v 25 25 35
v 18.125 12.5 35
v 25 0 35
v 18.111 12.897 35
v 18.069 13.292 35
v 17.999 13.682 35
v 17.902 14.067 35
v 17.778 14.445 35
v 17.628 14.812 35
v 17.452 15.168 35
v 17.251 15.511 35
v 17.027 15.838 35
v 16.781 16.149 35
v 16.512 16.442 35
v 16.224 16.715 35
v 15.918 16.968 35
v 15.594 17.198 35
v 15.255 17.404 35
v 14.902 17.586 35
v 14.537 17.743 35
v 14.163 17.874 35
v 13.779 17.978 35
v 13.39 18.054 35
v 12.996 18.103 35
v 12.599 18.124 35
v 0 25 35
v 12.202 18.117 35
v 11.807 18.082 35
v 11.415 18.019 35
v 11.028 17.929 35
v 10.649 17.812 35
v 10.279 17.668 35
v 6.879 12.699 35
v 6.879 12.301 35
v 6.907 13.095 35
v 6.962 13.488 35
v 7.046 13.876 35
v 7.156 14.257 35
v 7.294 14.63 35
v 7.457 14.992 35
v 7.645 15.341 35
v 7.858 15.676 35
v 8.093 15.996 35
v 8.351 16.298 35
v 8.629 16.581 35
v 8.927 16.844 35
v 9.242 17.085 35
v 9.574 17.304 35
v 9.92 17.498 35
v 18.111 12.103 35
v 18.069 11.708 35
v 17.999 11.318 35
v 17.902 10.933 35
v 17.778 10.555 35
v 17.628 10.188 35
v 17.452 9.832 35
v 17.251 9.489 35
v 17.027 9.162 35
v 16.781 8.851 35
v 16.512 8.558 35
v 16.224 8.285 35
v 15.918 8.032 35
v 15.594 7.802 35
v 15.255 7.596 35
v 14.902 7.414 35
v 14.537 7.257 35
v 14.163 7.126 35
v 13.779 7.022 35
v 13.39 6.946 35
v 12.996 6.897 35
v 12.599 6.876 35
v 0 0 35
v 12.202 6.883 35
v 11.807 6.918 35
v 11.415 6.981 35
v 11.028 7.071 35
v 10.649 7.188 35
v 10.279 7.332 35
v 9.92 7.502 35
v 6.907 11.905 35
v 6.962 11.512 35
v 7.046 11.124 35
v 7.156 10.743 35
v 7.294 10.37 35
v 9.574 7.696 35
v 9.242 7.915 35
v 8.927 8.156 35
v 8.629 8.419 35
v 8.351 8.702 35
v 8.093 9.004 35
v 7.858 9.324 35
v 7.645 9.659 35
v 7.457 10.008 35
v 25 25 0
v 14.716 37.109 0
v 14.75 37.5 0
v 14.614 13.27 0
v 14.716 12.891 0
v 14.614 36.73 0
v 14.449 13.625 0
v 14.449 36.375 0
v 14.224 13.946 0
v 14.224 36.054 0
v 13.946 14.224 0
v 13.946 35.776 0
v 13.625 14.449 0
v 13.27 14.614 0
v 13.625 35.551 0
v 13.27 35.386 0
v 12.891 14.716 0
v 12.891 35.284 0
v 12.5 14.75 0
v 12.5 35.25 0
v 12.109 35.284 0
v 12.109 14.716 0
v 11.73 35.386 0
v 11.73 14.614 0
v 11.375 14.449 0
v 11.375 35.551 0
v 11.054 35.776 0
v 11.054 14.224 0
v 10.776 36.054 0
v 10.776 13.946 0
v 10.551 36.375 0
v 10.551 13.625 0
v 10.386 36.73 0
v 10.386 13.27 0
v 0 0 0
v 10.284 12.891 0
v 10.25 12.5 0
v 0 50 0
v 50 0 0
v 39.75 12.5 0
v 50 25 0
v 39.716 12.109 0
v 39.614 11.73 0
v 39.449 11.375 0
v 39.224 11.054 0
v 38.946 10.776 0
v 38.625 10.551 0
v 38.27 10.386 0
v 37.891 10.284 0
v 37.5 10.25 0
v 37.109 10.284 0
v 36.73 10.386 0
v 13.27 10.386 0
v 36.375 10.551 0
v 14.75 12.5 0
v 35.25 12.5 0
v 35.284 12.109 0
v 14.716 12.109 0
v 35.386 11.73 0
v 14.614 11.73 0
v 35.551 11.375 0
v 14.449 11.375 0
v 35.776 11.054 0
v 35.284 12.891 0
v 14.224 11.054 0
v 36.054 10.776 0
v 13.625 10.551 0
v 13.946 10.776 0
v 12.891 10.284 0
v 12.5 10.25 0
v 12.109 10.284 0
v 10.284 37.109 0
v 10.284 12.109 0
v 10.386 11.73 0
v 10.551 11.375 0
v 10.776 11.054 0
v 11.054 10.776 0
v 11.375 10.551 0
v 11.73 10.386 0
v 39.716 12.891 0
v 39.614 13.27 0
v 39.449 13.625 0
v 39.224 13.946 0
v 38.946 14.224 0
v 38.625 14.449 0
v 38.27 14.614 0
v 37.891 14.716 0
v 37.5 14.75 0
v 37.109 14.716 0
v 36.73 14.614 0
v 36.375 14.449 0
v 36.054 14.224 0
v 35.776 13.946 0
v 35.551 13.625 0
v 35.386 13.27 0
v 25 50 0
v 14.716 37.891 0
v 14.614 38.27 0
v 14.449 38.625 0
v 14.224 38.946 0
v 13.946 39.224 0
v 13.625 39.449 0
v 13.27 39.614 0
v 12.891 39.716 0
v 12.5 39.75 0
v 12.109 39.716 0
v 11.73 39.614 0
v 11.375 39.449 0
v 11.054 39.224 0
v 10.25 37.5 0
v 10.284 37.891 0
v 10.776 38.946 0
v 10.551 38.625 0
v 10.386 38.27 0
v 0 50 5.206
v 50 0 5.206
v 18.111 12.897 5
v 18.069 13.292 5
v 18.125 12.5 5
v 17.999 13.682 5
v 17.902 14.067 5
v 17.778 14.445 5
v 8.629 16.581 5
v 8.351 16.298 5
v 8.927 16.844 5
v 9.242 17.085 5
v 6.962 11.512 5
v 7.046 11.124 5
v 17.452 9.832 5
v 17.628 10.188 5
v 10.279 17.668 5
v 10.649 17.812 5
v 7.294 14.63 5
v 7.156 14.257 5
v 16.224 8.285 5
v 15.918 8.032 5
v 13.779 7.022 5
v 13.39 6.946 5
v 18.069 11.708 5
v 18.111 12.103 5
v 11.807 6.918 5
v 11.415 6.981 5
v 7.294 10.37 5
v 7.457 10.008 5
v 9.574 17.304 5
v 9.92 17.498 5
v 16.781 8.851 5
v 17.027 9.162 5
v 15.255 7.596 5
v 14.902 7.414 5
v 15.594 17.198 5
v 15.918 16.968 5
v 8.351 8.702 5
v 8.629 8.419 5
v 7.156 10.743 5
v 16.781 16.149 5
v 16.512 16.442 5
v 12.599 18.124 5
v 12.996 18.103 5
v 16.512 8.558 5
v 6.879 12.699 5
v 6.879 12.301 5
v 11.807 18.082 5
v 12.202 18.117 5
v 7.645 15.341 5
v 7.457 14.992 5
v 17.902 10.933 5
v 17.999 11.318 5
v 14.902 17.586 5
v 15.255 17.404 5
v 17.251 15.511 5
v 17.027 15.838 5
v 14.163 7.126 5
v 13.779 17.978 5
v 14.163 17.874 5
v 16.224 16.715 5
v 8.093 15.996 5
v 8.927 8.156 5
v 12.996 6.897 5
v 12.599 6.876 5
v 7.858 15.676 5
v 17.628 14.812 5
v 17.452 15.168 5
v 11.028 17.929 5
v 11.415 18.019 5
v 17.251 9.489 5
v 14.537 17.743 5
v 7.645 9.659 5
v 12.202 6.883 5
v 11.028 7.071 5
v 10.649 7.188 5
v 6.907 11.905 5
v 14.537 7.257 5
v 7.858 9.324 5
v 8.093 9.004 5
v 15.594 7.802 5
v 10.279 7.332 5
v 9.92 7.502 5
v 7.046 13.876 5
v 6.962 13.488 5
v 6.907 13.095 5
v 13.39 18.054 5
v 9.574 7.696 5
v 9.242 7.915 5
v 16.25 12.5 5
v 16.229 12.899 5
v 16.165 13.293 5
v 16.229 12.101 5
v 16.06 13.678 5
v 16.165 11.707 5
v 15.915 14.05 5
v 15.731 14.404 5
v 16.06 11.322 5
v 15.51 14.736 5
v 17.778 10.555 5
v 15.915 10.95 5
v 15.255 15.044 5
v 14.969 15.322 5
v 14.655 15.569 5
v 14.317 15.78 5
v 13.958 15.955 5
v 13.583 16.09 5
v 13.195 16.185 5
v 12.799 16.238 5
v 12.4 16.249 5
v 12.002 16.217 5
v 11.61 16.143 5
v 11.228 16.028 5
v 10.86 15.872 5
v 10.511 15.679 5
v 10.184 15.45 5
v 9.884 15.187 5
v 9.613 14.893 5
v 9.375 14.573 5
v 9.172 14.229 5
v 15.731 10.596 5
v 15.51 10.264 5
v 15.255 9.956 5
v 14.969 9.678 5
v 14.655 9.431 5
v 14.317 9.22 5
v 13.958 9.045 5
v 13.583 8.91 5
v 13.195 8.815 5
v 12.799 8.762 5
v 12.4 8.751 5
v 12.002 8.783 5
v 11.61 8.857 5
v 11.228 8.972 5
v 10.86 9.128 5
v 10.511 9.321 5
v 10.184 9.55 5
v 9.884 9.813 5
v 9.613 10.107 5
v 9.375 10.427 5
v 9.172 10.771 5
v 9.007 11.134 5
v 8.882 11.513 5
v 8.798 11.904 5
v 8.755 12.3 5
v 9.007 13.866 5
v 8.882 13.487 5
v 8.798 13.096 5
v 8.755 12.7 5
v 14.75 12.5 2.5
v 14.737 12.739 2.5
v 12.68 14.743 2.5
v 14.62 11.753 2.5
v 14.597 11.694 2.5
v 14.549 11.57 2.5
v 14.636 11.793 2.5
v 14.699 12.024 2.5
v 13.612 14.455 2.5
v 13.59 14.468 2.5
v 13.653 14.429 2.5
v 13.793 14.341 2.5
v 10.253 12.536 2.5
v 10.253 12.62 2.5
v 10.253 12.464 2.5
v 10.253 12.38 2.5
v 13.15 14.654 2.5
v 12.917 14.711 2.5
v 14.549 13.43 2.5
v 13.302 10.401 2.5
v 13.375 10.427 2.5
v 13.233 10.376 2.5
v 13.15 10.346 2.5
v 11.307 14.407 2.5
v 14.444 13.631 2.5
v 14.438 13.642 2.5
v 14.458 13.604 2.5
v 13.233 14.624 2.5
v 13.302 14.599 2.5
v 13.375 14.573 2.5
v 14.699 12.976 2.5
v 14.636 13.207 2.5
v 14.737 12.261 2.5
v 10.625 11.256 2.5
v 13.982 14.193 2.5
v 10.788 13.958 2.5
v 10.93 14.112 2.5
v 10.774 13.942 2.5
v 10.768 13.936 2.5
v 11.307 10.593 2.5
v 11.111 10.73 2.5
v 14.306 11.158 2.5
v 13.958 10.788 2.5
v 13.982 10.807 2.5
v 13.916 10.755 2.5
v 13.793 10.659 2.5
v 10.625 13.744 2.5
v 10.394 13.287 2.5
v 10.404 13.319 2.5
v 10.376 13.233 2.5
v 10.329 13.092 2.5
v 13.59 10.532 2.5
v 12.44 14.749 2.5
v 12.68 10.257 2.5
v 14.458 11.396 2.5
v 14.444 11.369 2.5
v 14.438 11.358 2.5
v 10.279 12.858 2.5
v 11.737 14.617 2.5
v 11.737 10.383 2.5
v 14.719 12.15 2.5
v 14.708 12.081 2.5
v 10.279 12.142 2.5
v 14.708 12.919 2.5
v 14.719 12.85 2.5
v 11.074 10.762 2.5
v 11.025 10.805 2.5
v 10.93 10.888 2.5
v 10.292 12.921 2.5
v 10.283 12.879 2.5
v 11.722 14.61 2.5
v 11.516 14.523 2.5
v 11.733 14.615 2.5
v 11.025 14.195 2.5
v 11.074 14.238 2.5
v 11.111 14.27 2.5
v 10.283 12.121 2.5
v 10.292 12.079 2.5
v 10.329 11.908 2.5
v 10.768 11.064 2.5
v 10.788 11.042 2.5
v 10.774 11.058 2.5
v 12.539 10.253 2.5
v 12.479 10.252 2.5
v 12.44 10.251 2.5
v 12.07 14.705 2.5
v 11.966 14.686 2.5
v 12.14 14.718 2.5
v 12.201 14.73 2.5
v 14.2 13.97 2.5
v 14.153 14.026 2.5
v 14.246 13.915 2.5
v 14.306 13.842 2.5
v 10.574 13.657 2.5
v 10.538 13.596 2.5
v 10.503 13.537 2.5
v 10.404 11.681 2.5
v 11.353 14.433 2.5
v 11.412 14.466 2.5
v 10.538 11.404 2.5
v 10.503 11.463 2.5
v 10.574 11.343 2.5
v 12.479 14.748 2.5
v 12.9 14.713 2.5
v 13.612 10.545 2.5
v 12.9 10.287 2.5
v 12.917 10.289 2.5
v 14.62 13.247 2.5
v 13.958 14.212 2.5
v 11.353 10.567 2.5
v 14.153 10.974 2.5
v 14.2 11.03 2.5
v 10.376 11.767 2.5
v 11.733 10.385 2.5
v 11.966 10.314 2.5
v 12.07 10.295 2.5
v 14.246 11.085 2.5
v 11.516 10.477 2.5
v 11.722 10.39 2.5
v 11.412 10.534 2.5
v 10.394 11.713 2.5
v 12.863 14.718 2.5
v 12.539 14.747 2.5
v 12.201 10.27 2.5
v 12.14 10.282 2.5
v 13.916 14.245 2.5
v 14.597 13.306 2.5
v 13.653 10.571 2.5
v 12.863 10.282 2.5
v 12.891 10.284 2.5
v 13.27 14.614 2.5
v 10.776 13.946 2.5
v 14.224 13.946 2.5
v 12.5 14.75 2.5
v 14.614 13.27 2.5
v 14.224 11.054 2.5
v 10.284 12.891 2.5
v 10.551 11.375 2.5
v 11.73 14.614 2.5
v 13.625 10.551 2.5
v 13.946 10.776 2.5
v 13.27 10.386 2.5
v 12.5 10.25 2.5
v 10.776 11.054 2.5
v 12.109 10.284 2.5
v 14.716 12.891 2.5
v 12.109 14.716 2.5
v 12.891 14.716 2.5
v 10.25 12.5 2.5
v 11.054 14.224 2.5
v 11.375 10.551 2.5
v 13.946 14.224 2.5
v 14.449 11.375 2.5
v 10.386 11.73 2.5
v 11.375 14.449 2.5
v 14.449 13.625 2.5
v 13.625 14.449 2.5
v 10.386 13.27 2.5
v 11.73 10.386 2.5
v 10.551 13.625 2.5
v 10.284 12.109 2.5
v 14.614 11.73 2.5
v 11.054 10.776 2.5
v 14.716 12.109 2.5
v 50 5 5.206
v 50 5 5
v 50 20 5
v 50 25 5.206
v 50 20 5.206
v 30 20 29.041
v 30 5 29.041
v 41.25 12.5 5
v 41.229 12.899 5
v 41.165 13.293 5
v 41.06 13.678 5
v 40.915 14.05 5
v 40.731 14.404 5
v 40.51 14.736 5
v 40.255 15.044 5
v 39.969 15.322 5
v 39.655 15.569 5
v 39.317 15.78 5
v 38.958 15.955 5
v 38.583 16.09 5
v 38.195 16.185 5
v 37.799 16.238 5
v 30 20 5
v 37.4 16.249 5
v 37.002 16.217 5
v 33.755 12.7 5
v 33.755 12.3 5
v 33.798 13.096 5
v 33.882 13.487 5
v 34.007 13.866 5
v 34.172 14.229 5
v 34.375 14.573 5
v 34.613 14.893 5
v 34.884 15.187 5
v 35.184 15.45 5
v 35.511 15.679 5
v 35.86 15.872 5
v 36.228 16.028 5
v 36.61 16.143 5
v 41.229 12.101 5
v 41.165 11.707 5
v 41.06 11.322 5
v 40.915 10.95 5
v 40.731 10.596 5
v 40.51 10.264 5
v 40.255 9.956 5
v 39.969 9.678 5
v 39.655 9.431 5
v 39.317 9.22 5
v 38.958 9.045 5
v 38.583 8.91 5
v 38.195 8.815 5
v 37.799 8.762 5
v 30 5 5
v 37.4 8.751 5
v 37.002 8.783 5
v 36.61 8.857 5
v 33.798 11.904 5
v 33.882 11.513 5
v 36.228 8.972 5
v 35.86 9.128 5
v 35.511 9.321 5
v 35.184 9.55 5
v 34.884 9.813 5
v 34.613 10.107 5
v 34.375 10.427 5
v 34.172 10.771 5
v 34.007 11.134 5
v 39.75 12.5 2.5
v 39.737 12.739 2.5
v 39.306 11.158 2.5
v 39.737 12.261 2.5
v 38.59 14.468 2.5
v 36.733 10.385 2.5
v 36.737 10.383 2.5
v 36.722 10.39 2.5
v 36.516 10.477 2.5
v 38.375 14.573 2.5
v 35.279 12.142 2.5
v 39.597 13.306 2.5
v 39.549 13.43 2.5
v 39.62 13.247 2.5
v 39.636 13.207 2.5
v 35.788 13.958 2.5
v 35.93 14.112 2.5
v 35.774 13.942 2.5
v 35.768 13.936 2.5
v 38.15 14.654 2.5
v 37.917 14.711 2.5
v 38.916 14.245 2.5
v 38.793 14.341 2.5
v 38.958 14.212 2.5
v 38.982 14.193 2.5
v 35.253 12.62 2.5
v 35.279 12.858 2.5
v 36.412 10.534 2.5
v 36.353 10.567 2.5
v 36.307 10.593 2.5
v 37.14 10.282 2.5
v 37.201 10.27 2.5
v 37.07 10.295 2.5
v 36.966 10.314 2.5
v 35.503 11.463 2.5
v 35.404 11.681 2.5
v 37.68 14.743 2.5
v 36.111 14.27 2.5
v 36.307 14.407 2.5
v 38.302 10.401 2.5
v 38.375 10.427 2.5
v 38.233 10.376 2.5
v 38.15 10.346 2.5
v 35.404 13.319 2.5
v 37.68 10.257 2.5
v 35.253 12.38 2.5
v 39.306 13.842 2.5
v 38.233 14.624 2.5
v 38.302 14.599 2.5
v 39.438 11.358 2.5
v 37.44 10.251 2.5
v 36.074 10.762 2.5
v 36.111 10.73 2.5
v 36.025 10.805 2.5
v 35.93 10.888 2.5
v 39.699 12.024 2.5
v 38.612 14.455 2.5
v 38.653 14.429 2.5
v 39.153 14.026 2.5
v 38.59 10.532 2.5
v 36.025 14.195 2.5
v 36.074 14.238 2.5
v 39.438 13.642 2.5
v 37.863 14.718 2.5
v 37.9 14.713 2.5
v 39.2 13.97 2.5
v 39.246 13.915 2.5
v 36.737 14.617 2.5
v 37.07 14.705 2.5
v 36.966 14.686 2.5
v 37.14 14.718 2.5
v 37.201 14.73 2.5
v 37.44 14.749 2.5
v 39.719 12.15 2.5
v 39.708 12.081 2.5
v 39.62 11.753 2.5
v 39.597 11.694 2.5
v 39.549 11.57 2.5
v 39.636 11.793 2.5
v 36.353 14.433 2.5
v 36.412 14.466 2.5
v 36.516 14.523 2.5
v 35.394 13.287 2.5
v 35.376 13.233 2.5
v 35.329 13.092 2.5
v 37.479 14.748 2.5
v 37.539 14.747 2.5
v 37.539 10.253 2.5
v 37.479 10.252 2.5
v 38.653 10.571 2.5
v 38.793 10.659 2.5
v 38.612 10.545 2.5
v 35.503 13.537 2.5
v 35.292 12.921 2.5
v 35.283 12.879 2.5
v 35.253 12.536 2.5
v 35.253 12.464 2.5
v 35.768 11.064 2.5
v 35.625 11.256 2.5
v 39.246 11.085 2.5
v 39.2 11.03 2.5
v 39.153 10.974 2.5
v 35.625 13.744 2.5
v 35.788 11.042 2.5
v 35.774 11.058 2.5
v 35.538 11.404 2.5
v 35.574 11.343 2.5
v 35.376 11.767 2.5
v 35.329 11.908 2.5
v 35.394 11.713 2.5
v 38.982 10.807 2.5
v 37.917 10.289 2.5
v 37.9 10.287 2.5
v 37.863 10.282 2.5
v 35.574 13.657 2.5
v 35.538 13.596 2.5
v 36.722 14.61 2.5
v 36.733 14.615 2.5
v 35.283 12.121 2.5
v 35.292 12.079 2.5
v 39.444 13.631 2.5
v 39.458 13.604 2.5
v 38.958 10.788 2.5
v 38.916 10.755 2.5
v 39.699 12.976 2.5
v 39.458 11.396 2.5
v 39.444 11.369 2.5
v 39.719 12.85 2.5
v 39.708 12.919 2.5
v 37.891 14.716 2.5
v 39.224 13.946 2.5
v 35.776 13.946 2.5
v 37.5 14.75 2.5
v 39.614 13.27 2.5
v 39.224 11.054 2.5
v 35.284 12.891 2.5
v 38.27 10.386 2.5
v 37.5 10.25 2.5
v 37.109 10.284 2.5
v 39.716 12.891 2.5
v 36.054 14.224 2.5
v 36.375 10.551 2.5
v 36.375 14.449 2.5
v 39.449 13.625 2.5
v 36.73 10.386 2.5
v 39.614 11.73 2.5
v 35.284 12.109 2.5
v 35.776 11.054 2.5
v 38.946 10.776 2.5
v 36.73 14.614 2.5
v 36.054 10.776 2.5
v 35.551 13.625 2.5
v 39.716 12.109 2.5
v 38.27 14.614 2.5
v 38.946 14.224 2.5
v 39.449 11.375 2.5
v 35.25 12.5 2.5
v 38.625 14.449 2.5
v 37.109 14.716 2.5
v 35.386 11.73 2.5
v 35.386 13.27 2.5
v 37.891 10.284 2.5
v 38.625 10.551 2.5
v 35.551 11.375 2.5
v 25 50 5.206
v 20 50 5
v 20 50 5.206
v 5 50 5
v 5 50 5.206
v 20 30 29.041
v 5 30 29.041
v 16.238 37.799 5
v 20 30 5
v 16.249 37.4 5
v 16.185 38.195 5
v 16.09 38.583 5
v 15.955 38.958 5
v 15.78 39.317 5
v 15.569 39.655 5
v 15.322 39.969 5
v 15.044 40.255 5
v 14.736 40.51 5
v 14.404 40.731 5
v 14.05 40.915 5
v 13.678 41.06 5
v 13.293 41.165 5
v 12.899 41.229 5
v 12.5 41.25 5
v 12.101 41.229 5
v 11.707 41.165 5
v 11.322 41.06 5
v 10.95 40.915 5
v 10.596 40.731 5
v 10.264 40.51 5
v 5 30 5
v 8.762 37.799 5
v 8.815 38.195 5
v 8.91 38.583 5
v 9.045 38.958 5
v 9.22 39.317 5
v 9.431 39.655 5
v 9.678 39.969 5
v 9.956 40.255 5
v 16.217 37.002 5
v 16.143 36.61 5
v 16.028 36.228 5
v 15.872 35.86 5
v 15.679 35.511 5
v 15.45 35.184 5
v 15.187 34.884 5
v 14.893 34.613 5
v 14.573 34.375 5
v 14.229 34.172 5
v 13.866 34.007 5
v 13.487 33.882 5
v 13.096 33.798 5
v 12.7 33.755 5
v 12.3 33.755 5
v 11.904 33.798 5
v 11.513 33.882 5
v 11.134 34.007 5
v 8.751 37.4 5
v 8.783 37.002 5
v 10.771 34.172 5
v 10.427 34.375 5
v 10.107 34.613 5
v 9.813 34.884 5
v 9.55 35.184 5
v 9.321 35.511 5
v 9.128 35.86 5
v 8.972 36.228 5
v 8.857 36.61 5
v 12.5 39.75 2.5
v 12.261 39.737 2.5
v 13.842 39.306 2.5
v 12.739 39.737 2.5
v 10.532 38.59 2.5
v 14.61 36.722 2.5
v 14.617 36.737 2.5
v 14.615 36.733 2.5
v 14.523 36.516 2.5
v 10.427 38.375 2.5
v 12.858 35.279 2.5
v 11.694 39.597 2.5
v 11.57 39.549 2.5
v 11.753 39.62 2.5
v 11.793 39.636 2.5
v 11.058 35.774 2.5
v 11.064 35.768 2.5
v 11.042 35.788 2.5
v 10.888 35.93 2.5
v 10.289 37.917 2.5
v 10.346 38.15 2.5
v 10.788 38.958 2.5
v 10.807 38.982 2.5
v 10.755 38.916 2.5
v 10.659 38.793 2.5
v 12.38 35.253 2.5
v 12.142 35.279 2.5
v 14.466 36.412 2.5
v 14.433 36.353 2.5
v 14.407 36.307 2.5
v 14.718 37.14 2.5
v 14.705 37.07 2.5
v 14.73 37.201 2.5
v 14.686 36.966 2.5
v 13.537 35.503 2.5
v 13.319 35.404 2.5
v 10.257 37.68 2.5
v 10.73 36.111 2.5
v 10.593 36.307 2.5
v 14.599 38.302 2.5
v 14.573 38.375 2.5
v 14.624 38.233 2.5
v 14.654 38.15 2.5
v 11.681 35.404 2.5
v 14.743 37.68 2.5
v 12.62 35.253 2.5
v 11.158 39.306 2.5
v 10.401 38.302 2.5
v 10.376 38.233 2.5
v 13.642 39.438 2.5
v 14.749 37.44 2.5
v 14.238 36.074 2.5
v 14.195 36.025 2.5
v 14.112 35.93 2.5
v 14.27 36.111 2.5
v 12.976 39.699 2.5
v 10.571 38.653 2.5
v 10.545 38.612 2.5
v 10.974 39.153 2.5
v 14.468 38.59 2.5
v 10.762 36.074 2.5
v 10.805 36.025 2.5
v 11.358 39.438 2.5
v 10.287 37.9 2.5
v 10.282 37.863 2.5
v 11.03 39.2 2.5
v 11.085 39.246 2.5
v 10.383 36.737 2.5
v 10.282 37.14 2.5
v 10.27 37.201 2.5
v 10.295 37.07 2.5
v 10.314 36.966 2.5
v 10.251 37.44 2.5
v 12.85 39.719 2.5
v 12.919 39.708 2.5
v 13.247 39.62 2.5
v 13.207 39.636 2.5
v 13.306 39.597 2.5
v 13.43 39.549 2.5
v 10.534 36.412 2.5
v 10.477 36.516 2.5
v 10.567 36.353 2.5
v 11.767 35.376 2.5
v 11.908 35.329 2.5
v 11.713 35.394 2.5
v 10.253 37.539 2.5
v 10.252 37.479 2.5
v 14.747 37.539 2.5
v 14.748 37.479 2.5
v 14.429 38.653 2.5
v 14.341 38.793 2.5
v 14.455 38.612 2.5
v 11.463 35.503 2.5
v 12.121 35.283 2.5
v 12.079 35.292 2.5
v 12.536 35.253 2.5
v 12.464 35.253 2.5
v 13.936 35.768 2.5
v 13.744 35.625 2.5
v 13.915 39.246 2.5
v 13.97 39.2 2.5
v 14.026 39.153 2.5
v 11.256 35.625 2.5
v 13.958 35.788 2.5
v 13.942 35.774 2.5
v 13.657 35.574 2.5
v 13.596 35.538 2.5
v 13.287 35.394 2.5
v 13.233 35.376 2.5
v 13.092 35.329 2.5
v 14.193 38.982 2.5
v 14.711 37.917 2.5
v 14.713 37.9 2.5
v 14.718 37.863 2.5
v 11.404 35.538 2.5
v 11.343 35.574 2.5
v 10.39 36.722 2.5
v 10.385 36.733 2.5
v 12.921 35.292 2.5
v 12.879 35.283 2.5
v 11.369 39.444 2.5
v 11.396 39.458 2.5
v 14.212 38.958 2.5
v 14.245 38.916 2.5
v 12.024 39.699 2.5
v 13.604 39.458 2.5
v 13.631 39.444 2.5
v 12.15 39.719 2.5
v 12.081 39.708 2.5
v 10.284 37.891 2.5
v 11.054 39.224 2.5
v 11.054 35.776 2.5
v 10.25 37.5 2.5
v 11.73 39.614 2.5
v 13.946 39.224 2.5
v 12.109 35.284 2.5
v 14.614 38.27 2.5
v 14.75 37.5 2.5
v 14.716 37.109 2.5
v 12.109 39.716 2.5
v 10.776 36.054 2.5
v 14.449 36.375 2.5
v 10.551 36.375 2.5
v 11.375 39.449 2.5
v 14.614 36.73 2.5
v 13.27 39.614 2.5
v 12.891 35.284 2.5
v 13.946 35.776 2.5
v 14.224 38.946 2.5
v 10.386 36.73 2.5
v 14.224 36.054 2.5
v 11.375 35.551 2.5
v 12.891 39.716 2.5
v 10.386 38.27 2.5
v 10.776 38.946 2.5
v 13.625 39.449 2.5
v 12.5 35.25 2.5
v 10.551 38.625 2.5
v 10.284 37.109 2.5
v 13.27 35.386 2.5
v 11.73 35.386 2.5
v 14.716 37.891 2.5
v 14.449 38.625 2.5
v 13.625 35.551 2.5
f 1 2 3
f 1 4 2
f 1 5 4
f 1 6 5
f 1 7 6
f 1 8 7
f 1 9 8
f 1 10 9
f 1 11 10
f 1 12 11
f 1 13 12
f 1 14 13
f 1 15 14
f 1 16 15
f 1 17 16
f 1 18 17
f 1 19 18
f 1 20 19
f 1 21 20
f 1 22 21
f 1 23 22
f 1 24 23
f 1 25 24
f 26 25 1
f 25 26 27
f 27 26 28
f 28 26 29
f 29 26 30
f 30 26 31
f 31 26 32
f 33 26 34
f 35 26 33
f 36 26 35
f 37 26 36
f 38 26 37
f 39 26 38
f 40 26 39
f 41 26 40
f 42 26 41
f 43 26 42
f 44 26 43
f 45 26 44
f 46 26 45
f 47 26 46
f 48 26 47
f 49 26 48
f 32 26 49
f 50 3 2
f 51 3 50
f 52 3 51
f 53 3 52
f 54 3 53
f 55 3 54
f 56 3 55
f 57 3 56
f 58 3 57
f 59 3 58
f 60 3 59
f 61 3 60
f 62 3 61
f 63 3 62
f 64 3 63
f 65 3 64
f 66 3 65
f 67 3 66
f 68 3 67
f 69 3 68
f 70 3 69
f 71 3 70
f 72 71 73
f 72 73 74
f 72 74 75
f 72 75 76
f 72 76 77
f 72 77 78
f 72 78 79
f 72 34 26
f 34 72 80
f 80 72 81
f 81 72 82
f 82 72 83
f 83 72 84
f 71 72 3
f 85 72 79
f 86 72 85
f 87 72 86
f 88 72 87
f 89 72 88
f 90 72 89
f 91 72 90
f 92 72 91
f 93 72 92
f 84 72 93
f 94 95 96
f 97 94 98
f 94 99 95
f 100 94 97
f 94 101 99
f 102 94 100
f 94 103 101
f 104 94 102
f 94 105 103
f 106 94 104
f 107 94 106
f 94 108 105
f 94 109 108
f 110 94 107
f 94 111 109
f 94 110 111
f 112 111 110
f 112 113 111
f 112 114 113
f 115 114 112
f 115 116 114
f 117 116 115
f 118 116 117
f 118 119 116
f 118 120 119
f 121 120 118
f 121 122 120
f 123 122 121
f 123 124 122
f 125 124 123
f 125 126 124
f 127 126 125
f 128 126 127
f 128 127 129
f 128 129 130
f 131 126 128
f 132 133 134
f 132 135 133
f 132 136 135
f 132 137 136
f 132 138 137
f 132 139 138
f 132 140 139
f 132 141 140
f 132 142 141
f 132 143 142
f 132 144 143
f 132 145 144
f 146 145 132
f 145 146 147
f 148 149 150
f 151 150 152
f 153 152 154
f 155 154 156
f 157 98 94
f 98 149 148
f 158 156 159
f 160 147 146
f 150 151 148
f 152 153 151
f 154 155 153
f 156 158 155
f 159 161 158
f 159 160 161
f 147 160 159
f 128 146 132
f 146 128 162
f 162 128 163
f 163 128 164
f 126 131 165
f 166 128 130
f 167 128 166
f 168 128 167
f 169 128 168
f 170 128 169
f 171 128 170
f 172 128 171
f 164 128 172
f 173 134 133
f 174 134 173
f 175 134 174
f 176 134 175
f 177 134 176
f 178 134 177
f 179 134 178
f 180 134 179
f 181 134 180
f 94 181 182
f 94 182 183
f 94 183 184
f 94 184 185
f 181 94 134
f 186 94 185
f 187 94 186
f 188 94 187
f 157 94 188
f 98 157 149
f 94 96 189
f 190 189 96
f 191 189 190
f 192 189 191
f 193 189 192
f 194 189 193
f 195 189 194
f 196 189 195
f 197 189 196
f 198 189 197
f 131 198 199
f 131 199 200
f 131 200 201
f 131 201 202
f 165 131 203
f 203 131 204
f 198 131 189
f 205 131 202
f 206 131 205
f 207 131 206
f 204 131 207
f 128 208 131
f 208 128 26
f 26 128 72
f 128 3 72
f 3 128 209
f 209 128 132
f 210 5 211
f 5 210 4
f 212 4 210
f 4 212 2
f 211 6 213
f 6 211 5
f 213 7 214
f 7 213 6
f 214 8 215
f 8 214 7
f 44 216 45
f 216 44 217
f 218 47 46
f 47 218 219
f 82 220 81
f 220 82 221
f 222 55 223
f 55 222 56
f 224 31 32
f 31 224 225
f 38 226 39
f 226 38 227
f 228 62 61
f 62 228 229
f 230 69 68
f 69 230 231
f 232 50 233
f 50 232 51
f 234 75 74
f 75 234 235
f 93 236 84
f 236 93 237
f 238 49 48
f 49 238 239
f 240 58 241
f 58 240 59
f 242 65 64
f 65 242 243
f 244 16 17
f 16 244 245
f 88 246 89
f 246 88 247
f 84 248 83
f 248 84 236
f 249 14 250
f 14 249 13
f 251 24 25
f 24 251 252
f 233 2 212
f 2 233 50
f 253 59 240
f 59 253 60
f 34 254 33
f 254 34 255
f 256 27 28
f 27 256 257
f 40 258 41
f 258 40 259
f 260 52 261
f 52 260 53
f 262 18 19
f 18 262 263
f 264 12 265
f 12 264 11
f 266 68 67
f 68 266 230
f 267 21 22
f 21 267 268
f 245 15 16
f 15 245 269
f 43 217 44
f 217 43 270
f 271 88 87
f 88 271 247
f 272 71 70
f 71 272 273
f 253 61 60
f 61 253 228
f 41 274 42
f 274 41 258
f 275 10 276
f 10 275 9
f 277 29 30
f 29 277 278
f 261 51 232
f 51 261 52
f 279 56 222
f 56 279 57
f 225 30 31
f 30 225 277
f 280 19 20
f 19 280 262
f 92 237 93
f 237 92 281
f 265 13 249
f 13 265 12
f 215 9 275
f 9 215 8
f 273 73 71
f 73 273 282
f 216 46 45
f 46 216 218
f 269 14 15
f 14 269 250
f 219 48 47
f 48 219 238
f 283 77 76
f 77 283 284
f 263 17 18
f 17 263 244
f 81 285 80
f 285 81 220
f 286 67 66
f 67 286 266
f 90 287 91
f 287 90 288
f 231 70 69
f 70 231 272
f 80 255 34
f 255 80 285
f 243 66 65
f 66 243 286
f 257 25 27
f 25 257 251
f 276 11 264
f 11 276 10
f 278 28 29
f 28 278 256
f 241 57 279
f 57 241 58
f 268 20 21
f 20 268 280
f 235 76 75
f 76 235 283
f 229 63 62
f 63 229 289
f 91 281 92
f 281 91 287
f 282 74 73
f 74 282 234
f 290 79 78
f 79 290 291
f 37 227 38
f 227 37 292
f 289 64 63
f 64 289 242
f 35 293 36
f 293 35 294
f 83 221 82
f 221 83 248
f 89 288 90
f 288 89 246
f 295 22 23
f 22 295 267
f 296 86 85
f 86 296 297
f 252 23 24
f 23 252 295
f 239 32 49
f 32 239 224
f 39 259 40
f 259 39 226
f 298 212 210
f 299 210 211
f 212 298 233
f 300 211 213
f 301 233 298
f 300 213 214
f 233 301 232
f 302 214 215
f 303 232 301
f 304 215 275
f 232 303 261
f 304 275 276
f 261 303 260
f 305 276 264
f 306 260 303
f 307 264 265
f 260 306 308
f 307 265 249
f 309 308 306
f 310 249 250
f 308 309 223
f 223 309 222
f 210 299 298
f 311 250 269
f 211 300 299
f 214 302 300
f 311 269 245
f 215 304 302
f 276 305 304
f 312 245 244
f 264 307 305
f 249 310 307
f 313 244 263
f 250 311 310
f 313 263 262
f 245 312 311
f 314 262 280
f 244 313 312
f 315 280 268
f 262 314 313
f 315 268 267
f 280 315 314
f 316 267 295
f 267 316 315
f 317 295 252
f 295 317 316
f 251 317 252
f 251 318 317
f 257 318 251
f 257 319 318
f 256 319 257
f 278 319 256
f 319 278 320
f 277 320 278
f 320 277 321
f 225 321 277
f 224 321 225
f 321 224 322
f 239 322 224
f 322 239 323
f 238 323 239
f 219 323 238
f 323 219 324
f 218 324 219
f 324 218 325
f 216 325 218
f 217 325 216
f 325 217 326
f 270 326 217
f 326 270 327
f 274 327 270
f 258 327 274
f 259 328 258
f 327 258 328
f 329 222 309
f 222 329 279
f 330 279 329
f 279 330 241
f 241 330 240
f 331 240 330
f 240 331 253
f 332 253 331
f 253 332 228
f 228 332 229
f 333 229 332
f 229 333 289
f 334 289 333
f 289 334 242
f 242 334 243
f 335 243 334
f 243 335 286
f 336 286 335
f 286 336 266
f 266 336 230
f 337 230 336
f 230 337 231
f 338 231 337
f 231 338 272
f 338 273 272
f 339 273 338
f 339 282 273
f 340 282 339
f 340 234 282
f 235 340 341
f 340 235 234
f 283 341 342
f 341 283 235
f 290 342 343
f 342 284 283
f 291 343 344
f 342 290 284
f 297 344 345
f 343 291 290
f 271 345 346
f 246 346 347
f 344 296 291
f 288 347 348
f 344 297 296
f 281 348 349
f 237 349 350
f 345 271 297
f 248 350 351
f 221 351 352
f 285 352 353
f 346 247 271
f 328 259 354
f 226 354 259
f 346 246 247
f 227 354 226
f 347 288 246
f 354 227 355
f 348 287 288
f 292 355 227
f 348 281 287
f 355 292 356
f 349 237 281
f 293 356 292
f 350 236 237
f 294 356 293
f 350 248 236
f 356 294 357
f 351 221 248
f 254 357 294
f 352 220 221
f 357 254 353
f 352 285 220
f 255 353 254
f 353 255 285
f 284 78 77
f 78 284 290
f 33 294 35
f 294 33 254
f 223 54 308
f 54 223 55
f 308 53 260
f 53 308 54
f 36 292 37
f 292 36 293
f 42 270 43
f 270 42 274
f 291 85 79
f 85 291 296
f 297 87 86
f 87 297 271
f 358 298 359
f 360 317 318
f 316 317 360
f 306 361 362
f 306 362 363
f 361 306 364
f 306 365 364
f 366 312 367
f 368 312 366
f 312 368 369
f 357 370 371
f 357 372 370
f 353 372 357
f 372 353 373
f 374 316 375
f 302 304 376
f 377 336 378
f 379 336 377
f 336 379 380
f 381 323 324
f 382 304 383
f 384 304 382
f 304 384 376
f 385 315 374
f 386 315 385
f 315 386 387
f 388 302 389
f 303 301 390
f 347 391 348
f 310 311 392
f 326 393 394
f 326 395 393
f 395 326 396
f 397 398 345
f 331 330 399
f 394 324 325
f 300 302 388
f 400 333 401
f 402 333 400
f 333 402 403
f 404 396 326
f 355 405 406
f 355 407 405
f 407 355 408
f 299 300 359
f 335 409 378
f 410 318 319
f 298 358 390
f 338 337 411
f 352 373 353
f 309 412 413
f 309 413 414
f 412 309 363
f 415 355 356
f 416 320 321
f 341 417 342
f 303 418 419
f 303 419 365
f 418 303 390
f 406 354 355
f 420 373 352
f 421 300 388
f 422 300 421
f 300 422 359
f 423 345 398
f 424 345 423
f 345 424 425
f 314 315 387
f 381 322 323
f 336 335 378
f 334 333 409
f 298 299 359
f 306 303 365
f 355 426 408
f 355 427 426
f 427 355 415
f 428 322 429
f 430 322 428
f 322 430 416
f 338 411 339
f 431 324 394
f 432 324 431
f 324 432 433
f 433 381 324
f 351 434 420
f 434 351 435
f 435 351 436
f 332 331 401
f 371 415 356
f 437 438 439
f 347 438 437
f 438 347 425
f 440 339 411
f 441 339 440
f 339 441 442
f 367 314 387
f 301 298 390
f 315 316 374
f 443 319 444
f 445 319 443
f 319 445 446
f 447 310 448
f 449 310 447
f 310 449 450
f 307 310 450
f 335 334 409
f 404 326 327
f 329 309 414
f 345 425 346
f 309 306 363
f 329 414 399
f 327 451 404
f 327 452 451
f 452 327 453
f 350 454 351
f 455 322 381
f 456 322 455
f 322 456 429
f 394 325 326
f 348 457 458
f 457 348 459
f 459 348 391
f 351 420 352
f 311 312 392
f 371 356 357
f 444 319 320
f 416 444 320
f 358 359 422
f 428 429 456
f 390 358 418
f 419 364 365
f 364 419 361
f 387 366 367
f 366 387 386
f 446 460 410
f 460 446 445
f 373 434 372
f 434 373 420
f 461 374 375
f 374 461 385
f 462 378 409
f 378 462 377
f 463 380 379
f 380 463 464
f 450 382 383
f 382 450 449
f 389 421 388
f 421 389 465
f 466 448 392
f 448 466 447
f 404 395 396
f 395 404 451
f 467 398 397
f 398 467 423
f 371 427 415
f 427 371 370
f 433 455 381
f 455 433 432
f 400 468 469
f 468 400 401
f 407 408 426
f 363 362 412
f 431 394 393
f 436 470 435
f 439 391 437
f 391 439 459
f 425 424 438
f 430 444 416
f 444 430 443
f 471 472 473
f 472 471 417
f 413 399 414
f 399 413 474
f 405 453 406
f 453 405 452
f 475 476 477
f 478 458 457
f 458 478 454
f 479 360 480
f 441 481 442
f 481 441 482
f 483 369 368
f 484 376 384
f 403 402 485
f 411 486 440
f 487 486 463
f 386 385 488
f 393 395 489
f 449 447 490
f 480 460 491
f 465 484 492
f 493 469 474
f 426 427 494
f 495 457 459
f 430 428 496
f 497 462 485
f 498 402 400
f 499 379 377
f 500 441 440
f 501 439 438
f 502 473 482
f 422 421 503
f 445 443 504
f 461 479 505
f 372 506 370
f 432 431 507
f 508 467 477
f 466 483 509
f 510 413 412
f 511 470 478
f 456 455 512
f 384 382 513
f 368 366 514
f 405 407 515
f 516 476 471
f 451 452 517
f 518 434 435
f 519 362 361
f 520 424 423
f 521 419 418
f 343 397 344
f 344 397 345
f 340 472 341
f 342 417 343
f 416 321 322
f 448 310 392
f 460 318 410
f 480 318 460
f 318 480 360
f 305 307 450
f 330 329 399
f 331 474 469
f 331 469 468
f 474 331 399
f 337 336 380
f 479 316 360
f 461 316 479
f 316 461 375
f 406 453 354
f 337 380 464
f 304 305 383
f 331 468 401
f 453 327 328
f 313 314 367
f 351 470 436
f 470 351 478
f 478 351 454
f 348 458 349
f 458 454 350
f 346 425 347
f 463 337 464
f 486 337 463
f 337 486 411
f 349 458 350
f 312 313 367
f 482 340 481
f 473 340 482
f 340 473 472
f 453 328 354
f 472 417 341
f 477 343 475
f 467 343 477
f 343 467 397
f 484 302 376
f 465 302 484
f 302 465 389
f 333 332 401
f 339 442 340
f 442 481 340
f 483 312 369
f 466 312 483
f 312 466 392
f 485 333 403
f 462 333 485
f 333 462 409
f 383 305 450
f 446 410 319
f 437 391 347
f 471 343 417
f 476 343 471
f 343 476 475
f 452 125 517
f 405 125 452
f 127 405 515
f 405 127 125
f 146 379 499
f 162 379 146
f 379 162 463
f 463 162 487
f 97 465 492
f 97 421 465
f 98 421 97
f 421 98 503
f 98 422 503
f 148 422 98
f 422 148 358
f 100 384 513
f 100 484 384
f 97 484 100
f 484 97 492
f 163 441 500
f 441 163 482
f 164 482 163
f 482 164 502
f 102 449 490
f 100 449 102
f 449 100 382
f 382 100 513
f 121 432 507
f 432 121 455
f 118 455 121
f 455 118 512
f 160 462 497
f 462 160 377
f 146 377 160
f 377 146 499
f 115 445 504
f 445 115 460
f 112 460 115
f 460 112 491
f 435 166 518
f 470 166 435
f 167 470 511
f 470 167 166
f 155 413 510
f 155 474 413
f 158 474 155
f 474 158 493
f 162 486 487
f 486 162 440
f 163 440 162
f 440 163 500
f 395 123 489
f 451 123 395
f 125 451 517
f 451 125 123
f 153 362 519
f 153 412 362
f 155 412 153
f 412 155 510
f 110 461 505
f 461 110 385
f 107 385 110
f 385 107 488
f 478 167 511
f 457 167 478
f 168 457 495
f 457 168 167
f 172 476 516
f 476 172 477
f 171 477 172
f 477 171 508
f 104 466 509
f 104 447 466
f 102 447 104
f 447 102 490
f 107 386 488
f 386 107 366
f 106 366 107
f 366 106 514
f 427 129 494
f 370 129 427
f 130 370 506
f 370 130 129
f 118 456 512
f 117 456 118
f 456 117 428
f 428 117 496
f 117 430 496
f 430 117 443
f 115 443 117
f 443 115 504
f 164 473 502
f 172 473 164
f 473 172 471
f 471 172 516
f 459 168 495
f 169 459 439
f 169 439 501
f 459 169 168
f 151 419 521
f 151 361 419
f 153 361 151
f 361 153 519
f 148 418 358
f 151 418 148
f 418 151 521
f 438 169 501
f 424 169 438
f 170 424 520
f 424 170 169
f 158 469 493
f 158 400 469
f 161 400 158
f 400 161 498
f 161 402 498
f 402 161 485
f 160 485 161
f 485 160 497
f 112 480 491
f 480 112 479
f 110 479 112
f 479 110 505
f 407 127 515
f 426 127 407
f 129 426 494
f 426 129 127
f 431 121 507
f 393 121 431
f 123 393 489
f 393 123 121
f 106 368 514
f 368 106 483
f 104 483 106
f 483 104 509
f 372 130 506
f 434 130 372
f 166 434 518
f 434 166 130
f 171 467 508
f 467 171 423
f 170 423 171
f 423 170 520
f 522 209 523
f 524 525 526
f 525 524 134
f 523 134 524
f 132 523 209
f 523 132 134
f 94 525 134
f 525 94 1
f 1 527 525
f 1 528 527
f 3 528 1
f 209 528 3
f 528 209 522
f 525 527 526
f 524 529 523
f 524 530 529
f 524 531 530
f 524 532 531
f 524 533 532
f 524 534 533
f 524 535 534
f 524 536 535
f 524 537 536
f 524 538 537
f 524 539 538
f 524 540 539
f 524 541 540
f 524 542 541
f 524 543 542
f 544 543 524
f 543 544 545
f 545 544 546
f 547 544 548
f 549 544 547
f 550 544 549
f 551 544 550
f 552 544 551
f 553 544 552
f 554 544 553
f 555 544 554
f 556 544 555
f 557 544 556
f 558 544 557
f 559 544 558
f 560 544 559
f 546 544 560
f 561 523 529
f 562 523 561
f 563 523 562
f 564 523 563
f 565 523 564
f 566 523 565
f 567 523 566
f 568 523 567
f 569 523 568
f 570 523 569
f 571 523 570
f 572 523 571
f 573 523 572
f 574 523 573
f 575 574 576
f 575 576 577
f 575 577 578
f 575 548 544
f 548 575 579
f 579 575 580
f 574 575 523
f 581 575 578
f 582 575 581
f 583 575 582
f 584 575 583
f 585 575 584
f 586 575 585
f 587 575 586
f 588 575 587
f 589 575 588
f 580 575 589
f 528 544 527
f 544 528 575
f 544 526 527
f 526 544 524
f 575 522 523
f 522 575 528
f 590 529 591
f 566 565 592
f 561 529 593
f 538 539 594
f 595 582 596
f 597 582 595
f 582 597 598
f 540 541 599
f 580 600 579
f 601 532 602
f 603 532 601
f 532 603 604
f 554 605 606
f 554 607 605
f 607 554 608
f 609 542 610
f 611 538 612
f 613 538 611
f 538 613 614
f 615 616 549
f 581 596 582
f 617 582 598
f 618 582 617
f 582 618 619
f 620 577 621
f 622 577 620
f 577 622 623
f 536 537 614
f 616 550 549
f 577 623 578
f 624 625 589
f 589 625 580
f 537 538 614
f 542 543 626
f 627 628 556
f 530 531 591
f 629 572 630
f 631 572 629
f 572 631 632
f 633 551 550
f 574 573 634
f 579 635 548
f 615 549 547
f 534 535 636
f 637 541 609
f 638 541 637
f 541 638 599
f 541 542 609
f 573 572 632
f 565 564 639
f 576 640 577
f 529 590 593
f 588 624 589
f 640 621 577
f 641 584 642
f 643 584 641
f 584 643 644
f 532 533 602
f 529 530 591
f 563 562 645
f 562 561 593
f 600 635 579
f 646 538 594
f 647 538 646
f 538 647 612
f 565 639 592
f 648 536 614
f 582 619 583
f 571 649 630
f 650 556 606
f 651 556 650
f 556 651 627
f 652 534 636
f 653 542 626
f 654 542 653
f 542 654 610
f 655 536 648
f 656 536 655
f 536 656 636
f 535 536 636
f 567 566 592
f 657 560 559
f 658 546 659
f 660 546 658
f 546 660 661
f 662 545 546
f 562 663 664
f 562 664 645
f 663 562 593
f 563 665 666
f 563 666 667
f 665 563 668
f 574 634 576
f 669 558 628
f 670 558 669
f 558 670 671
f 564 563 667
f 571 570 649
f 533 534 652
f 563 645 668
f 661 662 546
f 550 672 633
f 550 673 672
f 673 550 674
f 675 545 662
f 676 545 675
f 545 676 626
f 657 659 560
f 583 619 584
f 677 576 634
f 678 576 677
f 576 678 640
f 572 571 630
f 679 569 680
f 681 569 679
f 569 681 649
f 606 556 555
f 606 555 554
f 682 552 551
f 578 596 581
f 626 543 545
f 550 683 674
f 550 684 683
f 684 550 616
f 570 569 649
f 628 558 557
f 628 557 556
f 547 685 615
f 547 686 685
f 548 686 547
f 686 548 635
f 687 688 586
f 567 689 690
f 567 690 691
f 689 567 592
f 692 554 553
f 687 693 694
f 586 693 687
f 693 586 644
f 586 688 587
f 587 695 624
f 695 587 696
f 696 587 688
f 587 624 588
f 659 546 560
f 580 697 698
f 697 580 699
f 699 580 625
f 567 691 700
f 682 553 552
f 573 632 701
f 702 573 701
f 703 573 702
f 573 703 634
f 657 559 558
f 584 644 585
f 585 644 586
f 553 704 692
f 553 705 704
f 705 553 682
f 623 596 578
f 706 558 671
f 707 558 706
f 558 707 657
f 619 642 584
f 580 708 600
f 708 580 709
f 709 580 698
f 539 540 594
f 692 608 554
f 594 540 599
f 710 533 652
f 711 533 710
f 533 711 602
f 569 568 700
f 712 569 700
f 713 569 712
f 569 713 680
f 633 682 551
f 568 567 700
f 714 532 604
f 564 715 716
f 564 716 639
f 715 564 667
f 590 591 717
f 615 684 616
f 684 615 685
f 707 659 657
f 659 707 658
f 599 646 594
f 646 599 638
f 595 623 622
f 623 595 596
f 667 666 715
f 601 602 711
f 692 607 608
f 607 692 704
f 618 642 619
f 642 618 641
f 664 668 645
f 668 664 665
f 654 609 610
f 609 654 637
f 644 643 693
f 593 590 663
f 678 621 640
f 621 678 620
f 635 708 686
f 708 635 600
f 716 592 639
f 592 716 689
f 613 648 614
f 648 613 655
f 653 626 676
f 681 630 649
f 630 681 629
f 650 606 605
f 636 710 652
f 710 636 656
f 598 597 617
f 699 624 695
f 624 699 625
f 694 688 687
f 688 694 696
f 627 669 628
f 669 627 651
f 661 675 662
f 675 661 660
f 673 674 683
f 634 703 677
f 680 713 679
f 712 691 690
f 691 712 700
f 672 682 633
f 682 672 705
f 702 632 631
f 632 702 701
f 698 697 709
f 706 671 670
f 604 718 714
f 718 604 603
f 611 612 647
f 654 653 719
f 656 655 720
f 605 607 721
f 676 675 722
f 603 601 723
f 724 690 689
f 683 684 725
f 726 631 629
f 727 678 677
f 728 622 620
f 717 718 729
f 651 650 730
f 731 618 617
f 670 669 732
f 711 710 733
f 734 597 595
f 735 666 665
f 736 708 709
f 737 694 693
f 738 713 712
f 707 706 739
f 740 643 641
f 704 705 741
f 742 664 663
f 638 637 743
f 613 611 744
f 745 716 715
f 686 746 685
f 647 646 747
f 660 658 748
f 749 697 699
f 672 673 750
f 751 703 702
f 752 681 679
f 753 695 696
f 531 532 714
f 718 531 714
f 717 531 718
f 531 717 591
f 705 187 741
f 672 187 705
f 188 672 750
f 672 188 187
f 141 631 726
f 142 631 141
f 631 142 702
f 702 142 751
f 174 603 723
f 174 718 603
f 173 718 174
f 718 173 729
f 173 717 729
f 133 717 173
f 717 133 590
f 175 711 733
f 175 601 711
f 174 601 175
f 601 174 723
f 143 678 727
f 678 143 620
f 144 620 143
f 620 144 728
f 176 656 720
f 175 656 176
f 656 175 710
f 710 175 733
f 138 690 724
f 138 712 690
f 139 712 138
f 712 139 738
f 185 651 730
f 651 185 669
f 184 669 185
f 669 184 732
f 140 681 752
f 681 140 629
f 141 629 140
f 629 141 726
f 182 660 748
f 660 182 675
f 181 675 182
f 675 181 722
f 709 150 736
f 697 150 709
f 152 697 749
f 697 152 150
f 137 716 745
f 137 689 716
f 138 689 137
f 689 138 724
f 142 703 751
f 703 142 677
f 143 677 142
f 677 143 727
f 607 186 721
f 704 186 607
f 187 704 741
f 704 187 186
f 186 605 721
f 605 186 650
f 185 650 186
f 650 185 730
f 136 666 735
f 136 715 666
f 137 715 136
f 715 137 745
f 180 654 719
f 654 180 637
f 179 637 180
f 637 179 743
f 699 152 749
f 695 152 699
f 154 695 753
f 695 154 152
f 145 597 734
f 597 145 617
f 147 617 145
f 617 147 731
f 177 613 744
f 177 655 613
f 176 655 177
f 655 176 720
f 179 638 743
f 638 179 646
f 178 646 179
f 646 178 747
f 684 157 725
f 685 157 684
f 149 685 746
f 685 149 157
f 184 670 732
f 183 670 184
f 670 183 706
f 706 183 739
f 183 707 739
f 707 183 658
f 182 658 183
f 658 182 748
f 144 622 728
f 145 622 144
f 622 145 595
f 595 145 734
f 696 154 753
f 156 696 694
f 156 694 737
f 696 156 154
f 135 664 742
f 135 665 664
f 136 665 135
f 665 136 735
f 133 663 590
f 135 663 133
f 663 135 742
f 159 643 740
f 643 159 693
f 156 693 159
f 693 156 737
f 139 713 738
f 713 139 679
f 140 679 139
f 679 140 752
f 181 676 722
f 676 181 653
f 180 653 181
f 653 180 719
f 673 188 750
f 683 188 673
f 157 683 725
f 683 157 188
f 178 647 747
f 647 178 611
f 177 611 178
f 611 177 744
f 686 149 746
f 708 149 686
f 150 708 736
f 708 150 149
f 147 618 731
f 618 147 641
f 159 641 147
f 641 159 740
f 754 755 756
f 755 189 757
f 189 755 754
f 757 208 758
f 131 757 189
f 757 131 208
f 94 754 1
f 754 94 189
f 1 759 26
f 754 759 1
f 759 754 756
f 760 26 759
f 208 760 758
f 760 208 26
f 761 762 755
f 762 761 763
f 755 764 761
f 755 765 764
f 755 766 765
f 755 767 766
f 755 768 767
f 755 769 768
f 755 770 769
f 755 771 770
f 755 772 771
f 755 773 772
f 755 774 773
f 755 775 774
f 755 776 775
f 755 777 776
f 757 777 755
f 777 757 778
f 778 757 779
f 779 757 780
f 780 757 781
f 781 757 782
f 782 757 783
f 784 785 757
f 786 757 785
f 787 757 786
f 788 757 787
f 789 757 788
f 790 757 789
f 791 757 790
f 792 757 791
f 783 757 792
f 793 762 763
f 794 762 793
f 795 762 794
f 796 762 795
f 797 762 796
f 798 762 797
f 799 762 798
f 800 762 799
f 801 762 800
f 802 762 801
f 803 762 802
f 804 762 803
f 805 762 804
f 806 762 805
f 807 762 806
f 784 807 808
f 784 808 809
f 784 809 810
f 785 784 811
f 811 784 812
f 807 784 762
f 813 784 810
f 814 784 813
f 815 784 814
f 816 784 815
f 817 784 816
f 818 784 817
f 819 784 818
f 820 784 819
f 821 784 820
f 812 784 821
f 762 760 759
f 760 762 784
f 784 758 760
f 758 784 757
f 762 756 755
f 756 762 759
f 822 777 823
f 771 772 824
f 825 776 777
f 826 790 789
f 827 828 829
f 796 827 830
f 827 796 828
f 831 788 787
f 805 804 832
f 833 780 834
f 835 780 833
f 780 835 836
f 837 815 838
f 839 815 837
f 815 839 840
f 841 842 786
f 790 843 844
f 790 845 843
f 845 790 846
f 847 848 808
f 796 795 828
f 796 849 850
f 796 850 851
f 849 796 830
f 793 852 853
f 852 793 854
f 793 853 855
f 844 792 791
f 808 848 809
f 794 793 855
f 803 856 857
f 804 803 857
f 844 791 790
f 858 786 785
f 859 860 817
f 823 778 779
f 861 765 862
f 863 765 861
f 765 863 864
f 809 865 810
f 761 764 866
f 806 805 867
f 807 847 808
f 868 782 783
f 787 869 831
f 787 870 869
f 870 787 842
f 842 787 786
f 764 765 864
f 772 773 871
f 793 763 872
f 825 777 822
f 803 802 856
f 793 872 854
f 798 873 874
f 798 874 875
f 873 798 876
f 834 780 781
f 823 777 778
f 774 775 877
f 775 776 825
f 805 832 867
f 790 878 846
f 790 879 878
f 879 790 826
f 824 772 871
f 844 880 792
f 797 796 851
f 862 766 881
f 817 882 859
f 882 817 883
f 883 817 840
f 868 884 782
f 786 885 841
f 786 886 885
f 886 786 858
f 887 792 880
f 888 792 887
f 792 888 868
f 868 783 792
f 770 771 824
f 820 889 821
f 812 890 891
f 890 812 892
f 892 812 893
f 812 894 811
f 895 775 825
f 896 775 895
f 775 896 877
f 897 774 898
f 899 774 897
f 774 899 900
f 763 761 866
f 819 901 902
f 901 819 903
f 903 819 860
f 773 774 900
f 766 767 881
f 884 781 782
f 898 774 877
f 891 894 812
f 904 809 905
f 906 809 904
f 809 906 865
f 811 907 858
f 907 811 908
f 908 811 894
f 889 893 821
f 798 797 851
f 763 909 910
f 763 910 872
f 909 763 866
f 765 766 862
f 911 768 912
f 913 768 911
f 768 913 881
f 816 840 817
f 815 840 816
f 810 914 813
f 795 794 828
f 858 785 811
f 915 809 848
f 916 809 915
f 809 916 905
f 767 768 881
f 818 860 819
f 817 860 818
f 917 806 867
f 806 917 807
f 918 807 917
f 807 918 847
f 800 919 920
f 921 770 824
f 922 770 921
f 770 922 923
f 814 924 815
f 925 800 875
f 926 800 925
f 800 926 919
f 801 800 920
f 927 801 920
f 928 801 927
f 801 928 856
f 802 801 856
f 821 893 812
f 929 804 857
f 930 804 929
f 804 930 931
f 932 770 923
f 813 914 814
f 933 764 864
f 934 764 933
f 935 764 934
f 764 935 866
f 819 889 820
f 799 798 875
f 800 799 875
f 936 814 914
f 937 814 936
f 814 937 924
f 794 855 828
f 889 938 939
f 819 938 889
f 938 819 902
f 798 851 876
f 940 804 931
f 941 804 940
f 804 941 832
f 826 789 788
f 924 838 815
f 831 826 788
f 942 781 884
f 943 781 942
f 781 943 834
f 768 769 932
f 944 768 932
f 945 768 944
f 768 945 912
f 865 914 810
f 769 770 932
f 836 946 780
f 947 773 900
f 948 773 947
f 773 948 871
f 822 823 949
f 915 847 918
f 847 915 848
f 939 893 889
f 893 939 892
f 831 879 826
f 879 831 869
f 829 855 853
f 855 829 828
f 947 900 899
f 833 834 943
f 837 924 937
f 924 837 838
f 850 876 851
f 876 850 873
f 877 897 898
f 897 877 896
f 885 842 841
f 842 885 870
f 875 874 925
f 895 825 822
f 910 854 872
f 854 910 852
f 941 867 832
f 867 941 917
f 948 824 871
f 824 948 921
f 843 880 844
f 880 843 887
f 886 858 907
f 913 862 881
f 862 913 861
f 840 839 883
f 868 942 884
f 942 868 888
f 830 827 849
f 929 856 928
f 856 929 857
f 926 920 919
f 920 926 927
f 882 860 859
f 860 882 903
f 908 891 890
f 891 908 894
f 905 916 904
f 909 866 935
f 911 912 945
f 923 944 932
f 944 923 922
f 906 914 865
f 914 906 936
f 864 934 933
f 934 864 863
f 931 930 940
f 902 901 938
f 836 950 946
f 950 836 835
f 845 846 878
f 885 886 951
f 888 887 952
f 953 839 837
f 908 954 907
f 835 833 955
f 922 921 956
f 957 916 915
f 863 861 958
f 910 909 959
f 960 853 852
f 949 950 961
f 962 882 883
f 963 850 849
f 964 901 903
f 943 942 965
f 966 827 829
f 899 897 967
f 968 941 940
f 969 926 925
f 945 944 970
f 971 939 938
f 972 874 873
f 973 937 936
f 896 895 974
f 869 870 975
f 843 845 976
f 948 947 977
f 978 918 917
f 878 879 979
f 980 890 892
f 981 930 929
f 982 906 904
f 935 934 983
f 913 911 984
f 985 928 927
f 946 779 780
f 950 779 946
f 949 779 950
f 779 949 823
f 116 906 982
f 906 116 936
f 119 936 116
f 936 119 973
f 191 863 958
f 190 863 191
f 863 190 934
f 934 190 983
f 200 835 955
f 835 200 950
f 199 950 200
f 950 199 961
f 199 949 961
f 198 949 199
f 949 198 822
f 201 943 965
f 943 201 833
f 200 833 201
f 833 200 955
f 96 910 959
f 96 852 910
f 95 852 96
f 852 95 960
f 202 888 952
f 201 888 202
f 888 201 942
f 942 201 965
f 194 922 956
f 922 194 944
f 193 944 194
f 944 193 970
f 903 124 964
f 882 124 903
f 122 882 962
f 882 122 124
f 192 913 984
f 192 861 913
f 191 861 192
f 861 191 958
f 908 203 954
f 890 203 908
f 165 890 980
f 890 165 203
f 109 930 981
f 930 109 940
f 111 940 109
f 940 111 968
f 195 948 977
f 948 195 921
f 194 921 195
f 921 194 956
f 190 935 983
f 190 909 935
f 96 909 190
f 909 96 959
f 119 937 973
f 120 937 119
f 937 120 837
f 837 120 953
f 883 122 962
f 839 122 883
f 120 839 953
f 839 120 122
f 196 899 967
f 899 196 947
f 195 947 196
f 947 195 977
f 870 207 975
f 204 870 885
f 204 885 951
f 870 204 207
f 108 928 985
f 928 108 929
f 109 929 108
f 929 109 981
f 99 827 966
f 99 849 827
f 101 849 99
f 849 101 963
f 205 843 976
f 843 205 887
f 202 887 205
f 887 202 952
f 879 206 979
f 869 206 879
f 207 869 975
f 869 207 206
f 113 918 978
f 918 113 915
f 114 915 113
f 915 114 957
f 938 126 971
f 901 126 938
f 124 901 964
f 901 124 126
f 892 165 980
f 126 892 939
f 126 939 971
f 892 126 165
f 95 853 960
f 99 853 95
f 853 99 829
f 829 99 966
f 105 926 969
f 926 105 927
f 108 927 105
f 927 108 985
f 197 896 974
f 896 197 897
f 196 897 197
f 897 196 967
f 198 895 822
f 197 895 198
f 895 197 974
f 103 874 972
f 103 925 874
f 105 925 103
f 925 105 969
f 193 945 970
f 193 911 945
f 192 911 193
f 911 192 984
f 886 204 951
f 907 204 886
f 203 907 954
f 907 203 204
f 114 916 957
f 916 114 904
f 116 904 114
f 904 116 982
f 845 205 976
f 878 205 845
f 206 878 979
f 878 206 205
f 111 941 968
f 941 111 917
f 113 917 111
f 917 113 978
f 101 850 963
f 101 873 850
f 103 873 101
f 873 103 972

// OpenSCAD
/*
    Hotplate Reflow Support Feet
    T. LeMense February 12, 2021
   
      
*/

fc_edge = 25;
fc_height = 35;
fc_flange = 5;
m4_head_dia = 7.5;
m4_body_dia = 4.5;
m4_head_h = 2.5;

$fa = 1;
$fs = 0.4;

difference() {
   {
      cube([fc_edge, fc_edge, fc_height]);
   }
   {
      translate([fc_edge/2,fc_edge/2,fc_height/2+fc_flange])
      cylinder(d=m4_head_dia*1.5,h=fc_height,center=true);
       
      translate([fc_edge*1/2,fc_edge/2,fc_flange-m4_head_h/2])
      cylinder(d1=m4_body_dia, d2=m4_head_dia,h=m4_head_h, center=true);
      translate([fc_edge*1/2,fc_edge/2,0])
      cylinder(d=m4_body_dia,h=fc_flange,center=true); 

   }
}

translate([fc_edge,0,0])
difference() {
   {
      cube([fc_edge, fc_edge, fc_height]);
   }
   {
      // sloped edge 
      translate([0,0,fc_height])
      rotate([0,50,0])
      cube([fc_edge*2, fc_edge, fc_height]);
       
      // remove cavity in between slope walls 
      translate([fc_flange,fc_flange,fc_flange]) 
      cube([fc_edge, fc_edge-2*fc_flange, fc_height]);
       
      // remove M4 flathead screw recess 
      translate([fc_edge*1/2,fc_edge/2,fc_flange-m4_head_h/2])
      cylinder(d1=m4_body_dia, d2=m4_head_dia,h=m4_head_h, center=true);
      translate([fc_edge*1/2,fc_edge/2,0])
      cylinder(d=m4_body_dia,h=fc_flange,center=true); 
       
   }  
}

translate([fc_edge,fc_edge,0])
rotate([0,0,90])
difference() {
   {
      cube([fc_edge, fc_edge, fc_height]);
   }
   {
      // sloped edge 
      translate([0,0,fc_height])
      rotate([0,50,0])
      cube([fc_edge*2, fc_edge, fc_height]);
       
      // remove cavity in between slope walls 
      translate([fc_flange,fc_flange,fc_flange]) 
      cube([fc_edge, fc_edge-2*fc_flange, fc_height]);
       
      translate([fc_edge*1/2,fc_edge/2,fc_flange-m4_head_h/2])
      cylinder(d1=m4_body_dia, d2=m4_head_dia,h=m4_head_h, center=true);
      translate([fc_edge*1/2,fc_edge/2,0])
      cylinder(d=m4_body_dia,h=fc_flange,center=true); 
   }  
}
